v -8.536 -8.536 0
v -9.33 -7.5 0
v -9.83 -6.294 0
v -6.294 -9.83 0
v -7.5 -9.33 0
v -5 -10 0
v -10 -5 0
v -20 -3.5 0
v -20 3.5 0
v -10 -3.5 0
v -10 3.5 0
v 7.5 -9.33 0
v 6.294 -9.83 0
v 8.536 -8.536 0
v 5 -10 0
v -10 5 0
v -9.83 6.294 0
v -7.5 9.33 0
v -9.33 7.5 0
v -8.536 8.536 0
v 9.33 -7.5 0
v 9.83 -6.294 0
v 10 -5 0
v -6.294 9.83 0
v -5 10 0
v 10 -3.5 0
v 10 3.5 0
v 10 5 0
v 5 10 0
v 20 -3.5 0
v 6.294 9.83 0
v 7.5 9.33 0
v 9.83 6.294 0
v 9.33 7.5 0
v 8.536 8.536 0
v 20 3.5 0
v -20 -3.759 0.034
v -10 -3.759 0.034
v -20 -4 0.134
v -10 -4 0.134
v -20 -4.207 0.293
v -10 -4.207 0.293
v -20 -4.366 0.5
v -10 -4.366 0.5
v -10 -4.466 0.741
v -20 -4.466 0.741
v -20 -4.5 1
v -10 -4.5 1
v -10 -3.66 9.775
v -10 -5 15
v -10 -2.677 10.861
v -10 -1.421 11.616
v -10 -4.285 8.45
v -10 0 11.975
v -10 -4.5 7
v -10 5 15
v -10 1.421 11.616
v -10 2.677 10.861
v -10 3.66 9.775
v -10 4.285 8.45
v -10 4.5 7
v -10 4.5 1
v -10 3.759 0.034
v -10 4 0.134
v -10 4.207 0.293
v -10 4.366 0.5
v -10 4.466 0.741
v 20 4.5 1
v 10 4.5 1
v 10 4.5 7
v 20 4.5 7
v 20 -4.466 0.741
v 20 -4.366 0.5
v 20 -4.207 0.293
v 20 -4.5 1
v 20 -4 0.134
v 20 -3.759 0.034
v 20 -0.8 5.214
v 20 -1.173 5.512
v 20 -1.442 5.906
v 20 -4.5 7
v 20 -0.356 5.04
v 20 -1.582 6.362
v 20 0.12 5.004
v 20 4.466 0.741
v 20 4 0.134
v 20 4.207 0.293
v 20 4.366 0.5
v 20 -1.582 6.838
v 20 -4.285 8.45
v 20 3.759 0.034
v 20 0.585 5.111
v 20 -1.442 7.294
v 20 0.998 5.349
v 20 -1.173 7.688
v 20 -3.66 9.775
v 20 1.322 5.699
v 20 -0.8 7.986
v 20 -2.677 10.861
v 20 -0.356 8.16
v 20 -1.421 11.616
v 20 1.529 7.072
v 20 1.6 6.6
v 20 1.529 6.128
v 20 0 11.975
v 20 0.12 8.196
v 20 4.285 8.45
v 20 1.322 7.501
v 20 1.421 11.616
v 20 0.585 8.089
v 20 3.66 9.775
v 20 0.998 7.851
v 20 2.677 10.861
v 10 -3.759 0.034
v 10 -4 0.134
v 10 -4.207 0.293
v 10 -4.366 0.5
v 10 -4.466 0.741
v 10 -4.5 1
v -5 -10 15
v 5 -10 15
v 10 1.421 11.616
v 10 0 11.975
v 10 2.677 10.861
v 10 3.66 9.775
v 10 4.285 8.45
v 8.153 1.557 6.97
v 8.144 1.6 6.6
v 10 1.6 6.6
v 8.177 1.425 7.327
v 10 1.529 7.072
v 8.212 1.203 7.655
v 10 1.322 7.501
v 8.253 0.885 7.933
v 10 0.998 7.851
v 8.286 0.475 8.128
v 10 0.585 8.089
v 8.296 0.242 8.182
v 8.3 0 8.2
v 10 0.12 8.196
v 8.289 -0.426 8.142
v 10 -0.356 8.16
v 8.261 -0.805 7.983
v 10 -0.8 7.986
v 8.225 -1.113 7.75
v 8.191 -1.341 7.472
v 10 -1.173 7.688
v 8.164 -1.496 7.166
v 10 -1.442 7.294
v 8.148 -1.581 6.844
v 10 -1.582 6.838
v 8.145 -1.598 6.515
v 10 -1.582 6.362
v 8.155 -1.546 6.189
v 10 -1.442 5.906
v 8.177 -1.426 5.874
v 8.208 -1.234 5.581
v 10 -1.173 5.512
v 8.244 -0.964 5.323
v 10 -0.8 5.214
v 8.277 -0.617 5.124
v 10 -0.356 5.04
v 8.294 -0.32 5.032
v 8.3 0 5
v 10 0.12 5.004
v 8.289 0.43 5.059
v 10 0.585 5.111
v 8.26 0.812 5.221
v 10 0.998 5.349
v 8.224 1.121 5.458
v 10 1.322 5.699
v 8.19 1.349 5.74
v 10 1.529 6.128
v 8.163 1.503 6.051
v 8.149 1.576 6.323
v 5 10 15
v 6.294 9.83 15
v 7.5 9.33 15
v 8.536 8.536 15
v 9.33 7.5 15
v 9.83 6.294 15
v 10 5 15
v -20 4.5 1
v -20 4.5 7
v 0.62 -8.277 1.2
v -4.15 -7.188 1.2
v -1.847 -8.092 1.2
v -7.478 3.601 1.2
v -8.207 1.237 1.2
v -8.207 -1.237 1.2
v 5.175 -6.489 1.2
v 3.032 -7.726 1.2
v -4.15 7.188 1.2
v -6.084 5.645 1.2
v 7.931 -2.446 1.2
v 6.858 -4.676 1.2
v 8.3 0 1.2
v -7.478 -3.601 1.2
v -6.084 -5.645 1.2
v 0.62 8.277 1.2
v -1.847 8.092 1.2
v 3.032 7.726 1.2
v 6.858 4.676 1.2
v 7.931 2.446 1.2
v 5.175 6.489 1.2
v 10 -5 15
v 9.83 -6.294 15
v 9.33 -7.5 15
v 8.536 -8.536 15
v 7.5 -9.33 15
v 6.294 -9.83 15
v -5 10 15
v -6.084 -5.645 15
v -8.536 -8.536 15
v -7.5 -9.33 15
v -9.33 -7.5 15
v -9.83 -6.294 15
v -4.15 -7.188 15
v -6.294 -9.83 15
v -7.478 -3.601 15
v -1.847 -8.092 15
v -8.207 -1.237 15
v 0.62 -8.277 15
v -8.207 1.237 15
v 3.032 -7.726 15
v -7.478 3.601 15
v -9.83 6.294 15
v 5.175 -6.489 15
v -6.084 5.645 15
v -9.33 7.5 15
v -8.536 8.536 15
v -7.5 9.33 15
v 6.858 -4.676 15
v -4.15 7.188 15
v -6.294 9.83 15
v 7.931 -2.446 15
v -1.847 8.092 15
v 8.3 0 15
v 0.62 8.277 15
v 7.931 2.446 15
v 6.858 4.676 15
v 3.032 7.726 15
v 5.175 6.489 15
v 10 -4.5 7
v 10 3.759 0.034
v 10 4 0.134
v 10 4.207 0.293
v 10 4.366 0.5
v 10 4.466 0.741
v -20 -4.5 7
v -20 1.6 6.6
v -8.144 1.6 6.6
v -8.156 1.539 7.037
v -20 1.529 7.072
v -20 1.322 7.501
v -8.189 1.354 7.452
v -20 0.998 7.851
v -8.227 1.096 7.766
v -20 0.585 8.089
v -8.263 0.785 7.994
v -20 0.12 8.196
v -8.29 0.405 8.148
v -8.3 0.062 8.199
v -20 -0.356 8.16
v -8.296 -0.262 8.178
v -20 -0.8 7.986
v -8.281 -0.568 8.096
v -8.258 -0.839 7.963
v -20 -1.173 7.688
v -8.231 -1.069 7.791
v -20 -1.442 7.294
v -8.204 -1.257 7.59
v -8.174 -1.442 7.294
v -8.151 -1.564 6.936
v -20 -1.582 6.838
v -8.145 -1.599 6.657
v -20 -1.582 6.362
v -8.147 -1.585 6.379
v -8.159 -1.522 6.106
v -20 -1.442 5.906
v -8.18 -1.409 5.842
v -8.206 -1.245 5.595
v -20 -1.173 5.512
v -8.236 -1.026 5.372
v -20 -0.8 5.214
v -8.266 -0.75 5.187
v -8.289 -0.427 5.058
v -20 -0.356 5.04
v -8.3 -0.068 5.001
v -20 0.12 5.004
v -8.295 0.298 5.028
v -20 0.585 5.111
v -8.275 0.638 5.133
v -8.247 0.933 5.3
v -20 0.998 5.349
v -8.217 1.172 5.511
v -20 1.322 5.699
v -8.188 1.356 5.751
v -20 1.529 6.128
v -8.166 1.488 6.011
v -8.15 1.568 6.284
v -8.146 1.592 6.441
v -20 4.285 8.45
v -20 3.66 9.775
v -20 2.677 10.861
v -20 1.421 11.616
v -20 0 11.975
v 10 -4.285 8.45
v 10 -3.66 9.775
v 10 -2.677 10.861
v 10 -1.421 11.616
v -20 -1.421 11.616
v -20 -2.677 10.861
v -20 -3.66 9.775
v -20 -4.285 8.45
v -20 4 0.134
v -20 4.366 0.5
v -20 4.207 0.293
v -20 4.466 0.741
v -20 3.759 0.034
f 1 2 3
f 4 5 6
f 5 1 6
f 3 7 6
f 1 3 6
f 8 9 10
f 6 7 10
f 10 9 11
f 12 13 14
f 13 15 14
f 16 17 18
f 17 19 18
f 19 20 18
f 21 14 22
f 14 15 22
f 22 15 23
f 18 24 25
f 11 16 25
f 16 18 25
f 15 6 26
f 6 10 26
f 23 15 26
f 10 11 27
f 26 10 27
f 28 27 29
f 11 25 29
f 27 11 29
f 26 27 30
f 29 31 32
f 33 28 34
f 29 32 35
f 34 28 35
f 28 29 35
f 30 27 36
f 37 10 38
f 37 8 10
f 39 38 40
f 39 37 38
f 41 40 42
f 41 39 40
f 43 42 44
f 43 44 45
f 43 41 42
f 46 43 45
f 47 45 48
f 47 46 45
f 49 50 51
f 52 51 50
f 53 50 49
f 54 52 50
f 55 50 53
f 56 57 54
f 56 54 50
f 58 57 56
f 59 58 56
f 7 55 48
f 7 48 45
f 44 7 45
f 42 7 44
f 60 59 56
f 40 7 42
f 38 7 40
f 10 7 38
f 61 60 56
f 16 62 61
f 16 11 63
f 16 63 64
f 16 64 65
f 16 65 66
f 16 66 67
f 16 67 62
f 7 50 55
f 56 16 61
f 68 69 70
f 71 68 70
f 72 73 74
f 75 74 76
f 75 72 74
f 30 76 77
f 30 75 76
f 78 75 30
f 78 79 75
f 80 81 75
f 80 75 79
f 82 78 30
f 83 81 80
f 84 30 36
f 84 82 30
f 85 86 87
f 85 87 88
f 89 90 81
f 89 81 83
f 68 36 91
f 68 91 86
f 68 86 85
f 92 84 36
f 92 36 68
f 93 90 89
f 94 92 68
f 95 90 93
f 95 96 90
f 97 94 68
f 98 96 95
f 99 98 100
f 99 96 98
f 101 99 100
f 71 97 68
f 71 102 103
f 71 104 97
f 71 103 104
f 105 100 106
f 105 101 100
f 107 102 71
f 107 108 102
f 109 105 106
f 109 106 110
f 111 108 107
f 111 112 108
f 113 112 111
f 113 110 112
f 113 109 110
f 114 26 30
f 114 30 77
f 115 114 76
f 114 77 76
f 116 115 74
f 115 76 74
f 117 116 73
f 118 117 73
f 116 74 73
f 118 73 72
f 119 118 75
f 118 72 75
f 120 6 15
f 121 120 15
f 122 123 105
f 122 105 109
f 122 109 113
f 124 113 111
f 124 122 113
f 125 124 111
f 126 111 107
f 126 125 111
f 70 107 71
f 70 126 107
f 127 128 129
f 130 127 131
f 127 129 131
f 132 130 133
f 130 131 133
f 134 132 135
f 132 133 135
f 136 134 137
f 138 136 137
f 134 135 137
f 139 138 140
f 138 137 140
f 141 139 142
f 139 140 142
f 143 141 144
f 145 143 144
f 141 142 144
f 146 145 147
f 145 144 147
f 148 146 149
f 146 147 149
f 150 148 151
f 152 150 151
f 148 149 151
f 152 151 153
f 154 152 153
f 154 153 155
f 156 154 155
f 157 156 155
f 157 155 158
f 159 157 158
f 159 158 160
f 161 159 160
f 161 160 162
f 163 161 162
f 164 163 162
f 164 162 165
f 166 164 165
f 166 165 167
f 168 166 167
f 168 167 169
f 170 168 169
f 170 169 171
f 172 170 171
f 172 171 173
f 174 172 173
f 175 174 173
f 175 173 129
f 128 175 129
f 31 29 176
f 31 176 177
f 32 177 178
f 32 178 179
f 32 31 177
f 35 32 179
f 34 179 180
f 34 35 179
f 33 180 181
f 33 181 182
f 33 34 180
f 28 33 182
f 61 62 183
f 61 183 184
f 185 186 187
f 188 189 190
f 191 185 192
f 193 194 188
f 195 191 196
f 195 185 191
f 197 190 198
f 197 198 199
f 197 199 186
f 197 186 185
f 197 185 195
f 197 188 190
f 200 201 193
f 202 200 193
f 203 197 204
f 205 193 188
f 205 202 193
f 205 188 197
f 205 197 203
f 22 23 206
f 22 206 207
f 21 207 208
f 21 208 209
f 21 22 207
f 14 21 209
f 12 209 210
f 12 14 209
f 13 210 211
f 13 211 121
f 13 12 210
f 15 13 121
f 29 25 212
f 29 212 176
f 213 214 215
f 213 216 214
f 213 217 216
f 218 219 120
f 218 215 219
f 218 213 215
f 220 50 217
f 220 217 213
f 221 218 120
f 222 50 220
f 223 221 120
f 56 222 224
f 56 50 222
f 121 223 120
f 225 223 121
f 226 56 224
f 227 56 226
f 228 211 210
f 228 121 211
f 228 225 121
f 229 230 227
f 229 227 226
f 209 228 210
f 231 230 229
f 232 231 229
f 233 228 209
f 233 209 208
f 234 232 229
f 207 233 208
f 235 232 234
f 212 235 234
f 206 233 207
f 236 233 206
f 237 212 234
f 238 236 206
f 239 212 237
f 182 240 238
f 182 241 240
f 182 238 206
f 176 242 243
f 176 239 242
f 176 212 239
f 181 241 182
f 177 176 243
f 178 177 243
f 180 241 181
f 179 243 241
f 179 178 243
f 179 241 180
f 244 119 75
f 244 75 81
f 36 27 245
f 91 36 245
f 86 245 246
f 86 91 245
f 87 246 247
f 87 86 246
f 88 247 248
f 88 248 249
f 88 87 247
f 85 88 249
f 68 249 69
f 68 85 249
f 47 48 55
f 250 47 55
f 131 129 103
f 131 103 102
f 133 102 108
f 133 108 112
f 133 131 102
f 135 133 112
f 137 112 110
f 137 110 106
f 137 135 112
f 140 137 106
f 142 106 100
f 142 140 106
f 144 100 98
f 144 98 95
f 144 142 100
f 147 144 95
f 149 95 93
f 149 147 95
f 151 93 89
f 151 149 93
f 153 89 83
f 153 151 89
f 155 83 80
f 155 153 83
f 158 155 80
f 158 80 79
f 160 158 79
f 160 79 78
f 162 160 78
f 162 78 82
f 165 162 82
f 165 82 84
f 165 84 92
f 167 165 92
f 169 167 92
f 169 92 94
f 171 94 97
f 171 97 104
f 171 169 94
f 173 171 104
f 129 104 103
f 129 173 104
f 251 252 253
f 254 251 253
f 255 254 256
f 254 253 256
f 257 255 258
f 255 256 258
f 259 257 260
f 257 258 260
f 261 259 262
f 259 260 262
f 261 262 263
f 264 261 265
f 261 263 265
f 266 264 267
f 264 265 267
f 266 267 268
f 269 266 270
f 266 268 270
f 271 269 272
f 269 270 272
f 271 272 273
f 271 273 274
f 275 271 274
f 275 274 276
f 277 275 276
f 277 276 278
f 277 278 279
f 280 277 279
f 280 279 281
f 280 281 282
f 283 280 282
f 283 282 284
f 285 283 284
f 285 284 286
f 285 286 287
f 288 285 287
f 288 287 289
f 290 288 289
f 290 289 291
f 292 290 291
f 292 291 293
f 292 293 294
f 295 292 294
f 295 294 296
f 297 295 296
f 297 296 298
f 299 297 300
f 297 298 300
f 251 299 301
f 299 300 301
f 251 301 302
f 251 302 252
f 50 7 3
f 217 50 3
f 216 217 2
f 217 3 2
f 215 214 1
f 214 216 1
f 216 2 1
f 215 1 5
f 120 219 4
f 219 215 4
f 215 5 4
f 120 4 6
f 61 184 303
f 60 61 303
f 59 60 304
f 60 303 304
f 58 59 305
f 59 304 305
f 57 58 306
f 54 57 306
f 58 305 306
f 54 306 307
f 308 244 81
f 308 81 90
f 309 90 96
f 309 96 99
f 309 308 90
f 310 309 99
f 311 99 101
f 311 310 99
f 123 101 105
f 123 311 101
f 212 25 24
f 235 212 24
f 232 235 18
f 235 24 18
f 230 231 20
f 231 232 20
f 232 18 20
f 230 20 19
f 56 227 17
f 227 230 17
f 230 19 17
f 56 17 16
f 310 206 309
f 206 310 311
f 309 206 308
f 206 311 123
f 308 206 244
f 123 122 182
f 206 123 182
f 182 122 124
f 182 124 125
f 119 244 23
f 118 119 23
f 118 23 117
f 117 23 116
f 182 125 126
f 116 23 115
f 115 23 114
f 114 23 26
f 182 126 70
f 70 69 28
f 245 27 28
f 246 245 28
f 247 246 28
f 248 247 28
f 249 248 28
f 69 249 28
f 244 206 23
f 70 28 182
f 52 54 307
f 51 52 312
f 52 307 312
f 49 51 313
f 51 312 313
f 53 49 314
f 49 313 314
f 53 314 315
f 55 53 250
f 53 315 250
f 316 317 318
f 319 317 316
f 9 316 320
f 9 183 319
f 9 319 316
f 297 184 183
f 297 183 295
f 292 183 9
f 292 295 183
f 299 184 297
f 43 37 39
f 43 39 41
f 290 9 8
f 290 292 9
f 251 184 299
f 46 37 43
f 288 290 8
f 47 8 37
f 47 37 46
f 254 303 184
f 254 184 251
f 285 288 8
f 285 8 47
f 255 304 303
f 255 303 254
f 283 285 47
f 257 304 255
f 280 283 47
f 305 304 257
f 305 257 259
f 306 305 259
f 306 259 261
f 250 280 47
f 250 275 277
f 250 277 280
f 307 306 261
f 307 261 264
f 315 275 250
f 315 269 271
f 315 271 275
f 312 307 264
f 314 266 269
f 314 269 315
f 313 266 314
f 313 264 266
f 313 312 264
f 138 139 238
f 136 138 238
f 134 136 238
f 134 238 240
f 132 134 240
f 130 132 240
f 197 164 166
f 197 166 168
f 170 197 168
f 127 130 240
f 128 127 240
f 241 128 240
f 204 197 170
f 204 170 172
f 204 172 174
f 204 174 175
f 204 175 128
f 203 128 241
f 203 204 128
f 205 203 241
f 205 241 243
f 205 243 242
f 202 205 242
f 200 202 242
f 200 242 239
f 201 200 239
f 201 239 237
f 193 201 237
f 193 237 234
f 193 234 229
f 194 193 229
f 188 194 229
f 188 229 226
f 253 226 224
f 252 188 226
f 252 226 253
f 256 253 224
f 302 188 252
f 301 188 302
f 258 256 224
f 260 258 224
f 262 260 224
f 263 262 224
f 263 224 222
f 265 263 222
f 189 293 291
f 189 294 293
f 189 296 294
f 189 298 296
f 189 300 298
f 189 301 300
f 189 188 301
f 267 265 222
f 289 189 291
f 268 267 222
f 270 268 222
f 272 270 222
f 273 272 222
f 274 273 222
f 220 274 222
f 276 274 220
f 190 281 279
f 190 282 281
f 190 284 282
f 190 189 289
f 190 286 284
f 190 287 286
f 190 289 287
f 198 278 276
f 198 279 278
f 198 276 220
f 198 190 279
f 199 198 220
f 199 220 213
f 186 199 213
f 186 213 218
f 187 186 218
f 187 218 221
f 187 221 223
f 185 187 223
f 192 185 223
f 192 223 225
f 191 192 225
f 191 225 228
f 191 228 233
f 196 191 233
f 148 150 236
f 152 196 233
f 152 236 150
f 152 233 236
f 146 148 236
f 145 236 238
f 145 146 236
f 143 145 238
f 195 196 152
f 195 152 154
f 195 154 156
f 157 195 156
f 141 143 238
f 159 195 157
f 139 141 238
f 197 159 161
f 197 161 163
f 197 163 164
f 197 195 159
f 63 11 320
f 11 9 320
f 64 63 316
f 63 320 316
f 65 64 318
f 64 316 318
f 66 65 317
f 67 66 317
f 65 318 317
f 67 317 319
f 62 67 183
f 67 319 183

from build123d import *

# Parameters (mm, degrees)
F0_W        = 20
F0_H        = 20
F0_R        = 8.3
F1_DEPTH    = 15
F2_W        = 9
F2_H        = 12
F3_DEPTH    = 10
F4_W        = 9
F4_H        = 12
F4_R        = 1.6
F5_DEPTH    = 10
F6_DEPTH    = 30.001
F7_DEPTH    = 1.2
F8_T1_DEPTH = 40
F8_T3_DEPTH = 22.5
F8_T5_DEPTH = 22.5
F9_R        = 1


# Not quite as in the source:
# - a fillet or chamfer that OpenCascade refuses, or shapes differently, is made with other operations: its cross-section is extruded or revolved along the edge and cut away or added


with BuildPart() as f1:
    # F0 (on Top) → F1 (new body)
    with BuildSketch(Plane.XY):
        Rectangle(F0_W, F0_H)
        Circle(F0_R, mode=Mode.SUBTRACT)
    extrude(amount=F1_DEPTH)

    # F2 (on face) → F3 (join)
    with BuildSketch(Plane(origin=(-10, 0, 0), x_dir=(0, -1, 0), z_dir=(-1, 0, 0))):
        with Locations((0, 6)):
            Rectangle(F2_W, F2_H)
    extrude(amount=F3_DEPTH)

    # F4 (on face) → F5 (join)
    with BuildSketch(Plane.YZ.offset(10)):
        with Locations((0, 6)):
            Rectangle(F4_W, F4_H)
        with Locations((0, 6.6)):
            Circle(F4_R, mode=Mode.SUBTRACT)
    extrude(amount=F5_DEPTH)

    # F4 (on face) → F6 (cut, through all)
    with BuildSketch(Plane.YZ.offset(10)):
        with Locations((0, 6.6)):
            Circle(F4_R)
    extrude(amount=-F6_DEPTH, mode=Mode.SUBTRACT)

    # F0 (on Top) → F7 (join)
    with BuildSketch(Plane.XY):
        Circle(F0_R)
    extrude(amount=F7_DEPTH)

    # F8: fillet of radius 5 on 8 edges, made by hand

    # F8_s2 → F8_t1 (cut)
    with BuildSketch(Plane.XY.offset(-12.5)):
        with BuildLine():
            ThreePointArc((-10, -5), (-8.5355339059, -8.5355339059), (-5, -10))
            Line((-5, -10), (-10, -10))
            Line((-10, -10), (-10, -5))
        make_face()
        with BuildLine():
            ThreePointArc((10, -5), (8.5355339059, -8.5355339059), (5, -10))
            Line((5, -10), (10, -10))
            Line((10, -10), (10, -5))
        make_face()
        with BuildLine():
            ThreePointArc((-5, 10), (-8.5355339059, 8.5355339059), (-10, 5))
            Line((-10, 5), (-10, 10))
            Line((-10, 10), (-5, 10))
        make_face()
        with BuildLine():
            ThreePointArc((5, 10), (8.5355339059, 8.5355339059), (10, 5))
            Line((10, 5), (10, 10))
            Line((10, 10), (5, 10))
        make_face()
    extrude(amount=F8_T1_DEPTH, mode=Mode.SUBTRACT)

    # F8_s4 → F8_t3 (cut)
    with BuildSketch(Plane.YZ.offset(-32.5)):
        with BuildLine():
            ThreePointArc((4.5, 7), (3.0355339059, 10.5355339059), (-0.5, 12))
            Line((-0.5, 12), (4.5, 12))
            Line((4.5, 12), (4.5, 7))
        make_face()
        with BuildLine():
            ThreePointArc((0.5, 12), (-3.0355339059, 10.5355339059), (-4.5, 7))
            Line((-4.5, 7), (-4.5, 12))
            Line((-4.5, 12), (0.5, 12))
        make_face()
    extrude(amount=F8_T3_DEPTH, mode=Mode.SUBTRACT)

    # F8_s6 → F8_t5 (cut)
    with BuildSketch(Plane.YZ.offset(10)):
        with BuildLine():
            ThreePointArc((-0.5, 12), (3.0355339059, 10.5355339059), (4.5, 7))
            Line((4.5, 7), (4.5, 12))
            Line((4.5, 12), (-0.5, 12))
        make_face()
        with BuildLine():
            ThreePointArc((-4.5, 7), (-3.0355339059, 10.5355339059), (0.5, 12))
            Line((0.5, 12), (-4.5, 12))
            Line((-4.5, 12), (-4.5, 7))
        make_face()
    extrude(amount=F8_T5_DEPTH, mode=Mode.SUBTRACT)

    # F9
    f9_edges = [f1.edges().sort_by_distance(p)[0] for p in [
        (15, -4.5, 0),
        (15, 4.5, 0),
        (-15, 4.5, 0),
        (-15, -4.5, 0),
    ]]
    fillet(f9_edges, radius=F9_R)


solid = f1.part
